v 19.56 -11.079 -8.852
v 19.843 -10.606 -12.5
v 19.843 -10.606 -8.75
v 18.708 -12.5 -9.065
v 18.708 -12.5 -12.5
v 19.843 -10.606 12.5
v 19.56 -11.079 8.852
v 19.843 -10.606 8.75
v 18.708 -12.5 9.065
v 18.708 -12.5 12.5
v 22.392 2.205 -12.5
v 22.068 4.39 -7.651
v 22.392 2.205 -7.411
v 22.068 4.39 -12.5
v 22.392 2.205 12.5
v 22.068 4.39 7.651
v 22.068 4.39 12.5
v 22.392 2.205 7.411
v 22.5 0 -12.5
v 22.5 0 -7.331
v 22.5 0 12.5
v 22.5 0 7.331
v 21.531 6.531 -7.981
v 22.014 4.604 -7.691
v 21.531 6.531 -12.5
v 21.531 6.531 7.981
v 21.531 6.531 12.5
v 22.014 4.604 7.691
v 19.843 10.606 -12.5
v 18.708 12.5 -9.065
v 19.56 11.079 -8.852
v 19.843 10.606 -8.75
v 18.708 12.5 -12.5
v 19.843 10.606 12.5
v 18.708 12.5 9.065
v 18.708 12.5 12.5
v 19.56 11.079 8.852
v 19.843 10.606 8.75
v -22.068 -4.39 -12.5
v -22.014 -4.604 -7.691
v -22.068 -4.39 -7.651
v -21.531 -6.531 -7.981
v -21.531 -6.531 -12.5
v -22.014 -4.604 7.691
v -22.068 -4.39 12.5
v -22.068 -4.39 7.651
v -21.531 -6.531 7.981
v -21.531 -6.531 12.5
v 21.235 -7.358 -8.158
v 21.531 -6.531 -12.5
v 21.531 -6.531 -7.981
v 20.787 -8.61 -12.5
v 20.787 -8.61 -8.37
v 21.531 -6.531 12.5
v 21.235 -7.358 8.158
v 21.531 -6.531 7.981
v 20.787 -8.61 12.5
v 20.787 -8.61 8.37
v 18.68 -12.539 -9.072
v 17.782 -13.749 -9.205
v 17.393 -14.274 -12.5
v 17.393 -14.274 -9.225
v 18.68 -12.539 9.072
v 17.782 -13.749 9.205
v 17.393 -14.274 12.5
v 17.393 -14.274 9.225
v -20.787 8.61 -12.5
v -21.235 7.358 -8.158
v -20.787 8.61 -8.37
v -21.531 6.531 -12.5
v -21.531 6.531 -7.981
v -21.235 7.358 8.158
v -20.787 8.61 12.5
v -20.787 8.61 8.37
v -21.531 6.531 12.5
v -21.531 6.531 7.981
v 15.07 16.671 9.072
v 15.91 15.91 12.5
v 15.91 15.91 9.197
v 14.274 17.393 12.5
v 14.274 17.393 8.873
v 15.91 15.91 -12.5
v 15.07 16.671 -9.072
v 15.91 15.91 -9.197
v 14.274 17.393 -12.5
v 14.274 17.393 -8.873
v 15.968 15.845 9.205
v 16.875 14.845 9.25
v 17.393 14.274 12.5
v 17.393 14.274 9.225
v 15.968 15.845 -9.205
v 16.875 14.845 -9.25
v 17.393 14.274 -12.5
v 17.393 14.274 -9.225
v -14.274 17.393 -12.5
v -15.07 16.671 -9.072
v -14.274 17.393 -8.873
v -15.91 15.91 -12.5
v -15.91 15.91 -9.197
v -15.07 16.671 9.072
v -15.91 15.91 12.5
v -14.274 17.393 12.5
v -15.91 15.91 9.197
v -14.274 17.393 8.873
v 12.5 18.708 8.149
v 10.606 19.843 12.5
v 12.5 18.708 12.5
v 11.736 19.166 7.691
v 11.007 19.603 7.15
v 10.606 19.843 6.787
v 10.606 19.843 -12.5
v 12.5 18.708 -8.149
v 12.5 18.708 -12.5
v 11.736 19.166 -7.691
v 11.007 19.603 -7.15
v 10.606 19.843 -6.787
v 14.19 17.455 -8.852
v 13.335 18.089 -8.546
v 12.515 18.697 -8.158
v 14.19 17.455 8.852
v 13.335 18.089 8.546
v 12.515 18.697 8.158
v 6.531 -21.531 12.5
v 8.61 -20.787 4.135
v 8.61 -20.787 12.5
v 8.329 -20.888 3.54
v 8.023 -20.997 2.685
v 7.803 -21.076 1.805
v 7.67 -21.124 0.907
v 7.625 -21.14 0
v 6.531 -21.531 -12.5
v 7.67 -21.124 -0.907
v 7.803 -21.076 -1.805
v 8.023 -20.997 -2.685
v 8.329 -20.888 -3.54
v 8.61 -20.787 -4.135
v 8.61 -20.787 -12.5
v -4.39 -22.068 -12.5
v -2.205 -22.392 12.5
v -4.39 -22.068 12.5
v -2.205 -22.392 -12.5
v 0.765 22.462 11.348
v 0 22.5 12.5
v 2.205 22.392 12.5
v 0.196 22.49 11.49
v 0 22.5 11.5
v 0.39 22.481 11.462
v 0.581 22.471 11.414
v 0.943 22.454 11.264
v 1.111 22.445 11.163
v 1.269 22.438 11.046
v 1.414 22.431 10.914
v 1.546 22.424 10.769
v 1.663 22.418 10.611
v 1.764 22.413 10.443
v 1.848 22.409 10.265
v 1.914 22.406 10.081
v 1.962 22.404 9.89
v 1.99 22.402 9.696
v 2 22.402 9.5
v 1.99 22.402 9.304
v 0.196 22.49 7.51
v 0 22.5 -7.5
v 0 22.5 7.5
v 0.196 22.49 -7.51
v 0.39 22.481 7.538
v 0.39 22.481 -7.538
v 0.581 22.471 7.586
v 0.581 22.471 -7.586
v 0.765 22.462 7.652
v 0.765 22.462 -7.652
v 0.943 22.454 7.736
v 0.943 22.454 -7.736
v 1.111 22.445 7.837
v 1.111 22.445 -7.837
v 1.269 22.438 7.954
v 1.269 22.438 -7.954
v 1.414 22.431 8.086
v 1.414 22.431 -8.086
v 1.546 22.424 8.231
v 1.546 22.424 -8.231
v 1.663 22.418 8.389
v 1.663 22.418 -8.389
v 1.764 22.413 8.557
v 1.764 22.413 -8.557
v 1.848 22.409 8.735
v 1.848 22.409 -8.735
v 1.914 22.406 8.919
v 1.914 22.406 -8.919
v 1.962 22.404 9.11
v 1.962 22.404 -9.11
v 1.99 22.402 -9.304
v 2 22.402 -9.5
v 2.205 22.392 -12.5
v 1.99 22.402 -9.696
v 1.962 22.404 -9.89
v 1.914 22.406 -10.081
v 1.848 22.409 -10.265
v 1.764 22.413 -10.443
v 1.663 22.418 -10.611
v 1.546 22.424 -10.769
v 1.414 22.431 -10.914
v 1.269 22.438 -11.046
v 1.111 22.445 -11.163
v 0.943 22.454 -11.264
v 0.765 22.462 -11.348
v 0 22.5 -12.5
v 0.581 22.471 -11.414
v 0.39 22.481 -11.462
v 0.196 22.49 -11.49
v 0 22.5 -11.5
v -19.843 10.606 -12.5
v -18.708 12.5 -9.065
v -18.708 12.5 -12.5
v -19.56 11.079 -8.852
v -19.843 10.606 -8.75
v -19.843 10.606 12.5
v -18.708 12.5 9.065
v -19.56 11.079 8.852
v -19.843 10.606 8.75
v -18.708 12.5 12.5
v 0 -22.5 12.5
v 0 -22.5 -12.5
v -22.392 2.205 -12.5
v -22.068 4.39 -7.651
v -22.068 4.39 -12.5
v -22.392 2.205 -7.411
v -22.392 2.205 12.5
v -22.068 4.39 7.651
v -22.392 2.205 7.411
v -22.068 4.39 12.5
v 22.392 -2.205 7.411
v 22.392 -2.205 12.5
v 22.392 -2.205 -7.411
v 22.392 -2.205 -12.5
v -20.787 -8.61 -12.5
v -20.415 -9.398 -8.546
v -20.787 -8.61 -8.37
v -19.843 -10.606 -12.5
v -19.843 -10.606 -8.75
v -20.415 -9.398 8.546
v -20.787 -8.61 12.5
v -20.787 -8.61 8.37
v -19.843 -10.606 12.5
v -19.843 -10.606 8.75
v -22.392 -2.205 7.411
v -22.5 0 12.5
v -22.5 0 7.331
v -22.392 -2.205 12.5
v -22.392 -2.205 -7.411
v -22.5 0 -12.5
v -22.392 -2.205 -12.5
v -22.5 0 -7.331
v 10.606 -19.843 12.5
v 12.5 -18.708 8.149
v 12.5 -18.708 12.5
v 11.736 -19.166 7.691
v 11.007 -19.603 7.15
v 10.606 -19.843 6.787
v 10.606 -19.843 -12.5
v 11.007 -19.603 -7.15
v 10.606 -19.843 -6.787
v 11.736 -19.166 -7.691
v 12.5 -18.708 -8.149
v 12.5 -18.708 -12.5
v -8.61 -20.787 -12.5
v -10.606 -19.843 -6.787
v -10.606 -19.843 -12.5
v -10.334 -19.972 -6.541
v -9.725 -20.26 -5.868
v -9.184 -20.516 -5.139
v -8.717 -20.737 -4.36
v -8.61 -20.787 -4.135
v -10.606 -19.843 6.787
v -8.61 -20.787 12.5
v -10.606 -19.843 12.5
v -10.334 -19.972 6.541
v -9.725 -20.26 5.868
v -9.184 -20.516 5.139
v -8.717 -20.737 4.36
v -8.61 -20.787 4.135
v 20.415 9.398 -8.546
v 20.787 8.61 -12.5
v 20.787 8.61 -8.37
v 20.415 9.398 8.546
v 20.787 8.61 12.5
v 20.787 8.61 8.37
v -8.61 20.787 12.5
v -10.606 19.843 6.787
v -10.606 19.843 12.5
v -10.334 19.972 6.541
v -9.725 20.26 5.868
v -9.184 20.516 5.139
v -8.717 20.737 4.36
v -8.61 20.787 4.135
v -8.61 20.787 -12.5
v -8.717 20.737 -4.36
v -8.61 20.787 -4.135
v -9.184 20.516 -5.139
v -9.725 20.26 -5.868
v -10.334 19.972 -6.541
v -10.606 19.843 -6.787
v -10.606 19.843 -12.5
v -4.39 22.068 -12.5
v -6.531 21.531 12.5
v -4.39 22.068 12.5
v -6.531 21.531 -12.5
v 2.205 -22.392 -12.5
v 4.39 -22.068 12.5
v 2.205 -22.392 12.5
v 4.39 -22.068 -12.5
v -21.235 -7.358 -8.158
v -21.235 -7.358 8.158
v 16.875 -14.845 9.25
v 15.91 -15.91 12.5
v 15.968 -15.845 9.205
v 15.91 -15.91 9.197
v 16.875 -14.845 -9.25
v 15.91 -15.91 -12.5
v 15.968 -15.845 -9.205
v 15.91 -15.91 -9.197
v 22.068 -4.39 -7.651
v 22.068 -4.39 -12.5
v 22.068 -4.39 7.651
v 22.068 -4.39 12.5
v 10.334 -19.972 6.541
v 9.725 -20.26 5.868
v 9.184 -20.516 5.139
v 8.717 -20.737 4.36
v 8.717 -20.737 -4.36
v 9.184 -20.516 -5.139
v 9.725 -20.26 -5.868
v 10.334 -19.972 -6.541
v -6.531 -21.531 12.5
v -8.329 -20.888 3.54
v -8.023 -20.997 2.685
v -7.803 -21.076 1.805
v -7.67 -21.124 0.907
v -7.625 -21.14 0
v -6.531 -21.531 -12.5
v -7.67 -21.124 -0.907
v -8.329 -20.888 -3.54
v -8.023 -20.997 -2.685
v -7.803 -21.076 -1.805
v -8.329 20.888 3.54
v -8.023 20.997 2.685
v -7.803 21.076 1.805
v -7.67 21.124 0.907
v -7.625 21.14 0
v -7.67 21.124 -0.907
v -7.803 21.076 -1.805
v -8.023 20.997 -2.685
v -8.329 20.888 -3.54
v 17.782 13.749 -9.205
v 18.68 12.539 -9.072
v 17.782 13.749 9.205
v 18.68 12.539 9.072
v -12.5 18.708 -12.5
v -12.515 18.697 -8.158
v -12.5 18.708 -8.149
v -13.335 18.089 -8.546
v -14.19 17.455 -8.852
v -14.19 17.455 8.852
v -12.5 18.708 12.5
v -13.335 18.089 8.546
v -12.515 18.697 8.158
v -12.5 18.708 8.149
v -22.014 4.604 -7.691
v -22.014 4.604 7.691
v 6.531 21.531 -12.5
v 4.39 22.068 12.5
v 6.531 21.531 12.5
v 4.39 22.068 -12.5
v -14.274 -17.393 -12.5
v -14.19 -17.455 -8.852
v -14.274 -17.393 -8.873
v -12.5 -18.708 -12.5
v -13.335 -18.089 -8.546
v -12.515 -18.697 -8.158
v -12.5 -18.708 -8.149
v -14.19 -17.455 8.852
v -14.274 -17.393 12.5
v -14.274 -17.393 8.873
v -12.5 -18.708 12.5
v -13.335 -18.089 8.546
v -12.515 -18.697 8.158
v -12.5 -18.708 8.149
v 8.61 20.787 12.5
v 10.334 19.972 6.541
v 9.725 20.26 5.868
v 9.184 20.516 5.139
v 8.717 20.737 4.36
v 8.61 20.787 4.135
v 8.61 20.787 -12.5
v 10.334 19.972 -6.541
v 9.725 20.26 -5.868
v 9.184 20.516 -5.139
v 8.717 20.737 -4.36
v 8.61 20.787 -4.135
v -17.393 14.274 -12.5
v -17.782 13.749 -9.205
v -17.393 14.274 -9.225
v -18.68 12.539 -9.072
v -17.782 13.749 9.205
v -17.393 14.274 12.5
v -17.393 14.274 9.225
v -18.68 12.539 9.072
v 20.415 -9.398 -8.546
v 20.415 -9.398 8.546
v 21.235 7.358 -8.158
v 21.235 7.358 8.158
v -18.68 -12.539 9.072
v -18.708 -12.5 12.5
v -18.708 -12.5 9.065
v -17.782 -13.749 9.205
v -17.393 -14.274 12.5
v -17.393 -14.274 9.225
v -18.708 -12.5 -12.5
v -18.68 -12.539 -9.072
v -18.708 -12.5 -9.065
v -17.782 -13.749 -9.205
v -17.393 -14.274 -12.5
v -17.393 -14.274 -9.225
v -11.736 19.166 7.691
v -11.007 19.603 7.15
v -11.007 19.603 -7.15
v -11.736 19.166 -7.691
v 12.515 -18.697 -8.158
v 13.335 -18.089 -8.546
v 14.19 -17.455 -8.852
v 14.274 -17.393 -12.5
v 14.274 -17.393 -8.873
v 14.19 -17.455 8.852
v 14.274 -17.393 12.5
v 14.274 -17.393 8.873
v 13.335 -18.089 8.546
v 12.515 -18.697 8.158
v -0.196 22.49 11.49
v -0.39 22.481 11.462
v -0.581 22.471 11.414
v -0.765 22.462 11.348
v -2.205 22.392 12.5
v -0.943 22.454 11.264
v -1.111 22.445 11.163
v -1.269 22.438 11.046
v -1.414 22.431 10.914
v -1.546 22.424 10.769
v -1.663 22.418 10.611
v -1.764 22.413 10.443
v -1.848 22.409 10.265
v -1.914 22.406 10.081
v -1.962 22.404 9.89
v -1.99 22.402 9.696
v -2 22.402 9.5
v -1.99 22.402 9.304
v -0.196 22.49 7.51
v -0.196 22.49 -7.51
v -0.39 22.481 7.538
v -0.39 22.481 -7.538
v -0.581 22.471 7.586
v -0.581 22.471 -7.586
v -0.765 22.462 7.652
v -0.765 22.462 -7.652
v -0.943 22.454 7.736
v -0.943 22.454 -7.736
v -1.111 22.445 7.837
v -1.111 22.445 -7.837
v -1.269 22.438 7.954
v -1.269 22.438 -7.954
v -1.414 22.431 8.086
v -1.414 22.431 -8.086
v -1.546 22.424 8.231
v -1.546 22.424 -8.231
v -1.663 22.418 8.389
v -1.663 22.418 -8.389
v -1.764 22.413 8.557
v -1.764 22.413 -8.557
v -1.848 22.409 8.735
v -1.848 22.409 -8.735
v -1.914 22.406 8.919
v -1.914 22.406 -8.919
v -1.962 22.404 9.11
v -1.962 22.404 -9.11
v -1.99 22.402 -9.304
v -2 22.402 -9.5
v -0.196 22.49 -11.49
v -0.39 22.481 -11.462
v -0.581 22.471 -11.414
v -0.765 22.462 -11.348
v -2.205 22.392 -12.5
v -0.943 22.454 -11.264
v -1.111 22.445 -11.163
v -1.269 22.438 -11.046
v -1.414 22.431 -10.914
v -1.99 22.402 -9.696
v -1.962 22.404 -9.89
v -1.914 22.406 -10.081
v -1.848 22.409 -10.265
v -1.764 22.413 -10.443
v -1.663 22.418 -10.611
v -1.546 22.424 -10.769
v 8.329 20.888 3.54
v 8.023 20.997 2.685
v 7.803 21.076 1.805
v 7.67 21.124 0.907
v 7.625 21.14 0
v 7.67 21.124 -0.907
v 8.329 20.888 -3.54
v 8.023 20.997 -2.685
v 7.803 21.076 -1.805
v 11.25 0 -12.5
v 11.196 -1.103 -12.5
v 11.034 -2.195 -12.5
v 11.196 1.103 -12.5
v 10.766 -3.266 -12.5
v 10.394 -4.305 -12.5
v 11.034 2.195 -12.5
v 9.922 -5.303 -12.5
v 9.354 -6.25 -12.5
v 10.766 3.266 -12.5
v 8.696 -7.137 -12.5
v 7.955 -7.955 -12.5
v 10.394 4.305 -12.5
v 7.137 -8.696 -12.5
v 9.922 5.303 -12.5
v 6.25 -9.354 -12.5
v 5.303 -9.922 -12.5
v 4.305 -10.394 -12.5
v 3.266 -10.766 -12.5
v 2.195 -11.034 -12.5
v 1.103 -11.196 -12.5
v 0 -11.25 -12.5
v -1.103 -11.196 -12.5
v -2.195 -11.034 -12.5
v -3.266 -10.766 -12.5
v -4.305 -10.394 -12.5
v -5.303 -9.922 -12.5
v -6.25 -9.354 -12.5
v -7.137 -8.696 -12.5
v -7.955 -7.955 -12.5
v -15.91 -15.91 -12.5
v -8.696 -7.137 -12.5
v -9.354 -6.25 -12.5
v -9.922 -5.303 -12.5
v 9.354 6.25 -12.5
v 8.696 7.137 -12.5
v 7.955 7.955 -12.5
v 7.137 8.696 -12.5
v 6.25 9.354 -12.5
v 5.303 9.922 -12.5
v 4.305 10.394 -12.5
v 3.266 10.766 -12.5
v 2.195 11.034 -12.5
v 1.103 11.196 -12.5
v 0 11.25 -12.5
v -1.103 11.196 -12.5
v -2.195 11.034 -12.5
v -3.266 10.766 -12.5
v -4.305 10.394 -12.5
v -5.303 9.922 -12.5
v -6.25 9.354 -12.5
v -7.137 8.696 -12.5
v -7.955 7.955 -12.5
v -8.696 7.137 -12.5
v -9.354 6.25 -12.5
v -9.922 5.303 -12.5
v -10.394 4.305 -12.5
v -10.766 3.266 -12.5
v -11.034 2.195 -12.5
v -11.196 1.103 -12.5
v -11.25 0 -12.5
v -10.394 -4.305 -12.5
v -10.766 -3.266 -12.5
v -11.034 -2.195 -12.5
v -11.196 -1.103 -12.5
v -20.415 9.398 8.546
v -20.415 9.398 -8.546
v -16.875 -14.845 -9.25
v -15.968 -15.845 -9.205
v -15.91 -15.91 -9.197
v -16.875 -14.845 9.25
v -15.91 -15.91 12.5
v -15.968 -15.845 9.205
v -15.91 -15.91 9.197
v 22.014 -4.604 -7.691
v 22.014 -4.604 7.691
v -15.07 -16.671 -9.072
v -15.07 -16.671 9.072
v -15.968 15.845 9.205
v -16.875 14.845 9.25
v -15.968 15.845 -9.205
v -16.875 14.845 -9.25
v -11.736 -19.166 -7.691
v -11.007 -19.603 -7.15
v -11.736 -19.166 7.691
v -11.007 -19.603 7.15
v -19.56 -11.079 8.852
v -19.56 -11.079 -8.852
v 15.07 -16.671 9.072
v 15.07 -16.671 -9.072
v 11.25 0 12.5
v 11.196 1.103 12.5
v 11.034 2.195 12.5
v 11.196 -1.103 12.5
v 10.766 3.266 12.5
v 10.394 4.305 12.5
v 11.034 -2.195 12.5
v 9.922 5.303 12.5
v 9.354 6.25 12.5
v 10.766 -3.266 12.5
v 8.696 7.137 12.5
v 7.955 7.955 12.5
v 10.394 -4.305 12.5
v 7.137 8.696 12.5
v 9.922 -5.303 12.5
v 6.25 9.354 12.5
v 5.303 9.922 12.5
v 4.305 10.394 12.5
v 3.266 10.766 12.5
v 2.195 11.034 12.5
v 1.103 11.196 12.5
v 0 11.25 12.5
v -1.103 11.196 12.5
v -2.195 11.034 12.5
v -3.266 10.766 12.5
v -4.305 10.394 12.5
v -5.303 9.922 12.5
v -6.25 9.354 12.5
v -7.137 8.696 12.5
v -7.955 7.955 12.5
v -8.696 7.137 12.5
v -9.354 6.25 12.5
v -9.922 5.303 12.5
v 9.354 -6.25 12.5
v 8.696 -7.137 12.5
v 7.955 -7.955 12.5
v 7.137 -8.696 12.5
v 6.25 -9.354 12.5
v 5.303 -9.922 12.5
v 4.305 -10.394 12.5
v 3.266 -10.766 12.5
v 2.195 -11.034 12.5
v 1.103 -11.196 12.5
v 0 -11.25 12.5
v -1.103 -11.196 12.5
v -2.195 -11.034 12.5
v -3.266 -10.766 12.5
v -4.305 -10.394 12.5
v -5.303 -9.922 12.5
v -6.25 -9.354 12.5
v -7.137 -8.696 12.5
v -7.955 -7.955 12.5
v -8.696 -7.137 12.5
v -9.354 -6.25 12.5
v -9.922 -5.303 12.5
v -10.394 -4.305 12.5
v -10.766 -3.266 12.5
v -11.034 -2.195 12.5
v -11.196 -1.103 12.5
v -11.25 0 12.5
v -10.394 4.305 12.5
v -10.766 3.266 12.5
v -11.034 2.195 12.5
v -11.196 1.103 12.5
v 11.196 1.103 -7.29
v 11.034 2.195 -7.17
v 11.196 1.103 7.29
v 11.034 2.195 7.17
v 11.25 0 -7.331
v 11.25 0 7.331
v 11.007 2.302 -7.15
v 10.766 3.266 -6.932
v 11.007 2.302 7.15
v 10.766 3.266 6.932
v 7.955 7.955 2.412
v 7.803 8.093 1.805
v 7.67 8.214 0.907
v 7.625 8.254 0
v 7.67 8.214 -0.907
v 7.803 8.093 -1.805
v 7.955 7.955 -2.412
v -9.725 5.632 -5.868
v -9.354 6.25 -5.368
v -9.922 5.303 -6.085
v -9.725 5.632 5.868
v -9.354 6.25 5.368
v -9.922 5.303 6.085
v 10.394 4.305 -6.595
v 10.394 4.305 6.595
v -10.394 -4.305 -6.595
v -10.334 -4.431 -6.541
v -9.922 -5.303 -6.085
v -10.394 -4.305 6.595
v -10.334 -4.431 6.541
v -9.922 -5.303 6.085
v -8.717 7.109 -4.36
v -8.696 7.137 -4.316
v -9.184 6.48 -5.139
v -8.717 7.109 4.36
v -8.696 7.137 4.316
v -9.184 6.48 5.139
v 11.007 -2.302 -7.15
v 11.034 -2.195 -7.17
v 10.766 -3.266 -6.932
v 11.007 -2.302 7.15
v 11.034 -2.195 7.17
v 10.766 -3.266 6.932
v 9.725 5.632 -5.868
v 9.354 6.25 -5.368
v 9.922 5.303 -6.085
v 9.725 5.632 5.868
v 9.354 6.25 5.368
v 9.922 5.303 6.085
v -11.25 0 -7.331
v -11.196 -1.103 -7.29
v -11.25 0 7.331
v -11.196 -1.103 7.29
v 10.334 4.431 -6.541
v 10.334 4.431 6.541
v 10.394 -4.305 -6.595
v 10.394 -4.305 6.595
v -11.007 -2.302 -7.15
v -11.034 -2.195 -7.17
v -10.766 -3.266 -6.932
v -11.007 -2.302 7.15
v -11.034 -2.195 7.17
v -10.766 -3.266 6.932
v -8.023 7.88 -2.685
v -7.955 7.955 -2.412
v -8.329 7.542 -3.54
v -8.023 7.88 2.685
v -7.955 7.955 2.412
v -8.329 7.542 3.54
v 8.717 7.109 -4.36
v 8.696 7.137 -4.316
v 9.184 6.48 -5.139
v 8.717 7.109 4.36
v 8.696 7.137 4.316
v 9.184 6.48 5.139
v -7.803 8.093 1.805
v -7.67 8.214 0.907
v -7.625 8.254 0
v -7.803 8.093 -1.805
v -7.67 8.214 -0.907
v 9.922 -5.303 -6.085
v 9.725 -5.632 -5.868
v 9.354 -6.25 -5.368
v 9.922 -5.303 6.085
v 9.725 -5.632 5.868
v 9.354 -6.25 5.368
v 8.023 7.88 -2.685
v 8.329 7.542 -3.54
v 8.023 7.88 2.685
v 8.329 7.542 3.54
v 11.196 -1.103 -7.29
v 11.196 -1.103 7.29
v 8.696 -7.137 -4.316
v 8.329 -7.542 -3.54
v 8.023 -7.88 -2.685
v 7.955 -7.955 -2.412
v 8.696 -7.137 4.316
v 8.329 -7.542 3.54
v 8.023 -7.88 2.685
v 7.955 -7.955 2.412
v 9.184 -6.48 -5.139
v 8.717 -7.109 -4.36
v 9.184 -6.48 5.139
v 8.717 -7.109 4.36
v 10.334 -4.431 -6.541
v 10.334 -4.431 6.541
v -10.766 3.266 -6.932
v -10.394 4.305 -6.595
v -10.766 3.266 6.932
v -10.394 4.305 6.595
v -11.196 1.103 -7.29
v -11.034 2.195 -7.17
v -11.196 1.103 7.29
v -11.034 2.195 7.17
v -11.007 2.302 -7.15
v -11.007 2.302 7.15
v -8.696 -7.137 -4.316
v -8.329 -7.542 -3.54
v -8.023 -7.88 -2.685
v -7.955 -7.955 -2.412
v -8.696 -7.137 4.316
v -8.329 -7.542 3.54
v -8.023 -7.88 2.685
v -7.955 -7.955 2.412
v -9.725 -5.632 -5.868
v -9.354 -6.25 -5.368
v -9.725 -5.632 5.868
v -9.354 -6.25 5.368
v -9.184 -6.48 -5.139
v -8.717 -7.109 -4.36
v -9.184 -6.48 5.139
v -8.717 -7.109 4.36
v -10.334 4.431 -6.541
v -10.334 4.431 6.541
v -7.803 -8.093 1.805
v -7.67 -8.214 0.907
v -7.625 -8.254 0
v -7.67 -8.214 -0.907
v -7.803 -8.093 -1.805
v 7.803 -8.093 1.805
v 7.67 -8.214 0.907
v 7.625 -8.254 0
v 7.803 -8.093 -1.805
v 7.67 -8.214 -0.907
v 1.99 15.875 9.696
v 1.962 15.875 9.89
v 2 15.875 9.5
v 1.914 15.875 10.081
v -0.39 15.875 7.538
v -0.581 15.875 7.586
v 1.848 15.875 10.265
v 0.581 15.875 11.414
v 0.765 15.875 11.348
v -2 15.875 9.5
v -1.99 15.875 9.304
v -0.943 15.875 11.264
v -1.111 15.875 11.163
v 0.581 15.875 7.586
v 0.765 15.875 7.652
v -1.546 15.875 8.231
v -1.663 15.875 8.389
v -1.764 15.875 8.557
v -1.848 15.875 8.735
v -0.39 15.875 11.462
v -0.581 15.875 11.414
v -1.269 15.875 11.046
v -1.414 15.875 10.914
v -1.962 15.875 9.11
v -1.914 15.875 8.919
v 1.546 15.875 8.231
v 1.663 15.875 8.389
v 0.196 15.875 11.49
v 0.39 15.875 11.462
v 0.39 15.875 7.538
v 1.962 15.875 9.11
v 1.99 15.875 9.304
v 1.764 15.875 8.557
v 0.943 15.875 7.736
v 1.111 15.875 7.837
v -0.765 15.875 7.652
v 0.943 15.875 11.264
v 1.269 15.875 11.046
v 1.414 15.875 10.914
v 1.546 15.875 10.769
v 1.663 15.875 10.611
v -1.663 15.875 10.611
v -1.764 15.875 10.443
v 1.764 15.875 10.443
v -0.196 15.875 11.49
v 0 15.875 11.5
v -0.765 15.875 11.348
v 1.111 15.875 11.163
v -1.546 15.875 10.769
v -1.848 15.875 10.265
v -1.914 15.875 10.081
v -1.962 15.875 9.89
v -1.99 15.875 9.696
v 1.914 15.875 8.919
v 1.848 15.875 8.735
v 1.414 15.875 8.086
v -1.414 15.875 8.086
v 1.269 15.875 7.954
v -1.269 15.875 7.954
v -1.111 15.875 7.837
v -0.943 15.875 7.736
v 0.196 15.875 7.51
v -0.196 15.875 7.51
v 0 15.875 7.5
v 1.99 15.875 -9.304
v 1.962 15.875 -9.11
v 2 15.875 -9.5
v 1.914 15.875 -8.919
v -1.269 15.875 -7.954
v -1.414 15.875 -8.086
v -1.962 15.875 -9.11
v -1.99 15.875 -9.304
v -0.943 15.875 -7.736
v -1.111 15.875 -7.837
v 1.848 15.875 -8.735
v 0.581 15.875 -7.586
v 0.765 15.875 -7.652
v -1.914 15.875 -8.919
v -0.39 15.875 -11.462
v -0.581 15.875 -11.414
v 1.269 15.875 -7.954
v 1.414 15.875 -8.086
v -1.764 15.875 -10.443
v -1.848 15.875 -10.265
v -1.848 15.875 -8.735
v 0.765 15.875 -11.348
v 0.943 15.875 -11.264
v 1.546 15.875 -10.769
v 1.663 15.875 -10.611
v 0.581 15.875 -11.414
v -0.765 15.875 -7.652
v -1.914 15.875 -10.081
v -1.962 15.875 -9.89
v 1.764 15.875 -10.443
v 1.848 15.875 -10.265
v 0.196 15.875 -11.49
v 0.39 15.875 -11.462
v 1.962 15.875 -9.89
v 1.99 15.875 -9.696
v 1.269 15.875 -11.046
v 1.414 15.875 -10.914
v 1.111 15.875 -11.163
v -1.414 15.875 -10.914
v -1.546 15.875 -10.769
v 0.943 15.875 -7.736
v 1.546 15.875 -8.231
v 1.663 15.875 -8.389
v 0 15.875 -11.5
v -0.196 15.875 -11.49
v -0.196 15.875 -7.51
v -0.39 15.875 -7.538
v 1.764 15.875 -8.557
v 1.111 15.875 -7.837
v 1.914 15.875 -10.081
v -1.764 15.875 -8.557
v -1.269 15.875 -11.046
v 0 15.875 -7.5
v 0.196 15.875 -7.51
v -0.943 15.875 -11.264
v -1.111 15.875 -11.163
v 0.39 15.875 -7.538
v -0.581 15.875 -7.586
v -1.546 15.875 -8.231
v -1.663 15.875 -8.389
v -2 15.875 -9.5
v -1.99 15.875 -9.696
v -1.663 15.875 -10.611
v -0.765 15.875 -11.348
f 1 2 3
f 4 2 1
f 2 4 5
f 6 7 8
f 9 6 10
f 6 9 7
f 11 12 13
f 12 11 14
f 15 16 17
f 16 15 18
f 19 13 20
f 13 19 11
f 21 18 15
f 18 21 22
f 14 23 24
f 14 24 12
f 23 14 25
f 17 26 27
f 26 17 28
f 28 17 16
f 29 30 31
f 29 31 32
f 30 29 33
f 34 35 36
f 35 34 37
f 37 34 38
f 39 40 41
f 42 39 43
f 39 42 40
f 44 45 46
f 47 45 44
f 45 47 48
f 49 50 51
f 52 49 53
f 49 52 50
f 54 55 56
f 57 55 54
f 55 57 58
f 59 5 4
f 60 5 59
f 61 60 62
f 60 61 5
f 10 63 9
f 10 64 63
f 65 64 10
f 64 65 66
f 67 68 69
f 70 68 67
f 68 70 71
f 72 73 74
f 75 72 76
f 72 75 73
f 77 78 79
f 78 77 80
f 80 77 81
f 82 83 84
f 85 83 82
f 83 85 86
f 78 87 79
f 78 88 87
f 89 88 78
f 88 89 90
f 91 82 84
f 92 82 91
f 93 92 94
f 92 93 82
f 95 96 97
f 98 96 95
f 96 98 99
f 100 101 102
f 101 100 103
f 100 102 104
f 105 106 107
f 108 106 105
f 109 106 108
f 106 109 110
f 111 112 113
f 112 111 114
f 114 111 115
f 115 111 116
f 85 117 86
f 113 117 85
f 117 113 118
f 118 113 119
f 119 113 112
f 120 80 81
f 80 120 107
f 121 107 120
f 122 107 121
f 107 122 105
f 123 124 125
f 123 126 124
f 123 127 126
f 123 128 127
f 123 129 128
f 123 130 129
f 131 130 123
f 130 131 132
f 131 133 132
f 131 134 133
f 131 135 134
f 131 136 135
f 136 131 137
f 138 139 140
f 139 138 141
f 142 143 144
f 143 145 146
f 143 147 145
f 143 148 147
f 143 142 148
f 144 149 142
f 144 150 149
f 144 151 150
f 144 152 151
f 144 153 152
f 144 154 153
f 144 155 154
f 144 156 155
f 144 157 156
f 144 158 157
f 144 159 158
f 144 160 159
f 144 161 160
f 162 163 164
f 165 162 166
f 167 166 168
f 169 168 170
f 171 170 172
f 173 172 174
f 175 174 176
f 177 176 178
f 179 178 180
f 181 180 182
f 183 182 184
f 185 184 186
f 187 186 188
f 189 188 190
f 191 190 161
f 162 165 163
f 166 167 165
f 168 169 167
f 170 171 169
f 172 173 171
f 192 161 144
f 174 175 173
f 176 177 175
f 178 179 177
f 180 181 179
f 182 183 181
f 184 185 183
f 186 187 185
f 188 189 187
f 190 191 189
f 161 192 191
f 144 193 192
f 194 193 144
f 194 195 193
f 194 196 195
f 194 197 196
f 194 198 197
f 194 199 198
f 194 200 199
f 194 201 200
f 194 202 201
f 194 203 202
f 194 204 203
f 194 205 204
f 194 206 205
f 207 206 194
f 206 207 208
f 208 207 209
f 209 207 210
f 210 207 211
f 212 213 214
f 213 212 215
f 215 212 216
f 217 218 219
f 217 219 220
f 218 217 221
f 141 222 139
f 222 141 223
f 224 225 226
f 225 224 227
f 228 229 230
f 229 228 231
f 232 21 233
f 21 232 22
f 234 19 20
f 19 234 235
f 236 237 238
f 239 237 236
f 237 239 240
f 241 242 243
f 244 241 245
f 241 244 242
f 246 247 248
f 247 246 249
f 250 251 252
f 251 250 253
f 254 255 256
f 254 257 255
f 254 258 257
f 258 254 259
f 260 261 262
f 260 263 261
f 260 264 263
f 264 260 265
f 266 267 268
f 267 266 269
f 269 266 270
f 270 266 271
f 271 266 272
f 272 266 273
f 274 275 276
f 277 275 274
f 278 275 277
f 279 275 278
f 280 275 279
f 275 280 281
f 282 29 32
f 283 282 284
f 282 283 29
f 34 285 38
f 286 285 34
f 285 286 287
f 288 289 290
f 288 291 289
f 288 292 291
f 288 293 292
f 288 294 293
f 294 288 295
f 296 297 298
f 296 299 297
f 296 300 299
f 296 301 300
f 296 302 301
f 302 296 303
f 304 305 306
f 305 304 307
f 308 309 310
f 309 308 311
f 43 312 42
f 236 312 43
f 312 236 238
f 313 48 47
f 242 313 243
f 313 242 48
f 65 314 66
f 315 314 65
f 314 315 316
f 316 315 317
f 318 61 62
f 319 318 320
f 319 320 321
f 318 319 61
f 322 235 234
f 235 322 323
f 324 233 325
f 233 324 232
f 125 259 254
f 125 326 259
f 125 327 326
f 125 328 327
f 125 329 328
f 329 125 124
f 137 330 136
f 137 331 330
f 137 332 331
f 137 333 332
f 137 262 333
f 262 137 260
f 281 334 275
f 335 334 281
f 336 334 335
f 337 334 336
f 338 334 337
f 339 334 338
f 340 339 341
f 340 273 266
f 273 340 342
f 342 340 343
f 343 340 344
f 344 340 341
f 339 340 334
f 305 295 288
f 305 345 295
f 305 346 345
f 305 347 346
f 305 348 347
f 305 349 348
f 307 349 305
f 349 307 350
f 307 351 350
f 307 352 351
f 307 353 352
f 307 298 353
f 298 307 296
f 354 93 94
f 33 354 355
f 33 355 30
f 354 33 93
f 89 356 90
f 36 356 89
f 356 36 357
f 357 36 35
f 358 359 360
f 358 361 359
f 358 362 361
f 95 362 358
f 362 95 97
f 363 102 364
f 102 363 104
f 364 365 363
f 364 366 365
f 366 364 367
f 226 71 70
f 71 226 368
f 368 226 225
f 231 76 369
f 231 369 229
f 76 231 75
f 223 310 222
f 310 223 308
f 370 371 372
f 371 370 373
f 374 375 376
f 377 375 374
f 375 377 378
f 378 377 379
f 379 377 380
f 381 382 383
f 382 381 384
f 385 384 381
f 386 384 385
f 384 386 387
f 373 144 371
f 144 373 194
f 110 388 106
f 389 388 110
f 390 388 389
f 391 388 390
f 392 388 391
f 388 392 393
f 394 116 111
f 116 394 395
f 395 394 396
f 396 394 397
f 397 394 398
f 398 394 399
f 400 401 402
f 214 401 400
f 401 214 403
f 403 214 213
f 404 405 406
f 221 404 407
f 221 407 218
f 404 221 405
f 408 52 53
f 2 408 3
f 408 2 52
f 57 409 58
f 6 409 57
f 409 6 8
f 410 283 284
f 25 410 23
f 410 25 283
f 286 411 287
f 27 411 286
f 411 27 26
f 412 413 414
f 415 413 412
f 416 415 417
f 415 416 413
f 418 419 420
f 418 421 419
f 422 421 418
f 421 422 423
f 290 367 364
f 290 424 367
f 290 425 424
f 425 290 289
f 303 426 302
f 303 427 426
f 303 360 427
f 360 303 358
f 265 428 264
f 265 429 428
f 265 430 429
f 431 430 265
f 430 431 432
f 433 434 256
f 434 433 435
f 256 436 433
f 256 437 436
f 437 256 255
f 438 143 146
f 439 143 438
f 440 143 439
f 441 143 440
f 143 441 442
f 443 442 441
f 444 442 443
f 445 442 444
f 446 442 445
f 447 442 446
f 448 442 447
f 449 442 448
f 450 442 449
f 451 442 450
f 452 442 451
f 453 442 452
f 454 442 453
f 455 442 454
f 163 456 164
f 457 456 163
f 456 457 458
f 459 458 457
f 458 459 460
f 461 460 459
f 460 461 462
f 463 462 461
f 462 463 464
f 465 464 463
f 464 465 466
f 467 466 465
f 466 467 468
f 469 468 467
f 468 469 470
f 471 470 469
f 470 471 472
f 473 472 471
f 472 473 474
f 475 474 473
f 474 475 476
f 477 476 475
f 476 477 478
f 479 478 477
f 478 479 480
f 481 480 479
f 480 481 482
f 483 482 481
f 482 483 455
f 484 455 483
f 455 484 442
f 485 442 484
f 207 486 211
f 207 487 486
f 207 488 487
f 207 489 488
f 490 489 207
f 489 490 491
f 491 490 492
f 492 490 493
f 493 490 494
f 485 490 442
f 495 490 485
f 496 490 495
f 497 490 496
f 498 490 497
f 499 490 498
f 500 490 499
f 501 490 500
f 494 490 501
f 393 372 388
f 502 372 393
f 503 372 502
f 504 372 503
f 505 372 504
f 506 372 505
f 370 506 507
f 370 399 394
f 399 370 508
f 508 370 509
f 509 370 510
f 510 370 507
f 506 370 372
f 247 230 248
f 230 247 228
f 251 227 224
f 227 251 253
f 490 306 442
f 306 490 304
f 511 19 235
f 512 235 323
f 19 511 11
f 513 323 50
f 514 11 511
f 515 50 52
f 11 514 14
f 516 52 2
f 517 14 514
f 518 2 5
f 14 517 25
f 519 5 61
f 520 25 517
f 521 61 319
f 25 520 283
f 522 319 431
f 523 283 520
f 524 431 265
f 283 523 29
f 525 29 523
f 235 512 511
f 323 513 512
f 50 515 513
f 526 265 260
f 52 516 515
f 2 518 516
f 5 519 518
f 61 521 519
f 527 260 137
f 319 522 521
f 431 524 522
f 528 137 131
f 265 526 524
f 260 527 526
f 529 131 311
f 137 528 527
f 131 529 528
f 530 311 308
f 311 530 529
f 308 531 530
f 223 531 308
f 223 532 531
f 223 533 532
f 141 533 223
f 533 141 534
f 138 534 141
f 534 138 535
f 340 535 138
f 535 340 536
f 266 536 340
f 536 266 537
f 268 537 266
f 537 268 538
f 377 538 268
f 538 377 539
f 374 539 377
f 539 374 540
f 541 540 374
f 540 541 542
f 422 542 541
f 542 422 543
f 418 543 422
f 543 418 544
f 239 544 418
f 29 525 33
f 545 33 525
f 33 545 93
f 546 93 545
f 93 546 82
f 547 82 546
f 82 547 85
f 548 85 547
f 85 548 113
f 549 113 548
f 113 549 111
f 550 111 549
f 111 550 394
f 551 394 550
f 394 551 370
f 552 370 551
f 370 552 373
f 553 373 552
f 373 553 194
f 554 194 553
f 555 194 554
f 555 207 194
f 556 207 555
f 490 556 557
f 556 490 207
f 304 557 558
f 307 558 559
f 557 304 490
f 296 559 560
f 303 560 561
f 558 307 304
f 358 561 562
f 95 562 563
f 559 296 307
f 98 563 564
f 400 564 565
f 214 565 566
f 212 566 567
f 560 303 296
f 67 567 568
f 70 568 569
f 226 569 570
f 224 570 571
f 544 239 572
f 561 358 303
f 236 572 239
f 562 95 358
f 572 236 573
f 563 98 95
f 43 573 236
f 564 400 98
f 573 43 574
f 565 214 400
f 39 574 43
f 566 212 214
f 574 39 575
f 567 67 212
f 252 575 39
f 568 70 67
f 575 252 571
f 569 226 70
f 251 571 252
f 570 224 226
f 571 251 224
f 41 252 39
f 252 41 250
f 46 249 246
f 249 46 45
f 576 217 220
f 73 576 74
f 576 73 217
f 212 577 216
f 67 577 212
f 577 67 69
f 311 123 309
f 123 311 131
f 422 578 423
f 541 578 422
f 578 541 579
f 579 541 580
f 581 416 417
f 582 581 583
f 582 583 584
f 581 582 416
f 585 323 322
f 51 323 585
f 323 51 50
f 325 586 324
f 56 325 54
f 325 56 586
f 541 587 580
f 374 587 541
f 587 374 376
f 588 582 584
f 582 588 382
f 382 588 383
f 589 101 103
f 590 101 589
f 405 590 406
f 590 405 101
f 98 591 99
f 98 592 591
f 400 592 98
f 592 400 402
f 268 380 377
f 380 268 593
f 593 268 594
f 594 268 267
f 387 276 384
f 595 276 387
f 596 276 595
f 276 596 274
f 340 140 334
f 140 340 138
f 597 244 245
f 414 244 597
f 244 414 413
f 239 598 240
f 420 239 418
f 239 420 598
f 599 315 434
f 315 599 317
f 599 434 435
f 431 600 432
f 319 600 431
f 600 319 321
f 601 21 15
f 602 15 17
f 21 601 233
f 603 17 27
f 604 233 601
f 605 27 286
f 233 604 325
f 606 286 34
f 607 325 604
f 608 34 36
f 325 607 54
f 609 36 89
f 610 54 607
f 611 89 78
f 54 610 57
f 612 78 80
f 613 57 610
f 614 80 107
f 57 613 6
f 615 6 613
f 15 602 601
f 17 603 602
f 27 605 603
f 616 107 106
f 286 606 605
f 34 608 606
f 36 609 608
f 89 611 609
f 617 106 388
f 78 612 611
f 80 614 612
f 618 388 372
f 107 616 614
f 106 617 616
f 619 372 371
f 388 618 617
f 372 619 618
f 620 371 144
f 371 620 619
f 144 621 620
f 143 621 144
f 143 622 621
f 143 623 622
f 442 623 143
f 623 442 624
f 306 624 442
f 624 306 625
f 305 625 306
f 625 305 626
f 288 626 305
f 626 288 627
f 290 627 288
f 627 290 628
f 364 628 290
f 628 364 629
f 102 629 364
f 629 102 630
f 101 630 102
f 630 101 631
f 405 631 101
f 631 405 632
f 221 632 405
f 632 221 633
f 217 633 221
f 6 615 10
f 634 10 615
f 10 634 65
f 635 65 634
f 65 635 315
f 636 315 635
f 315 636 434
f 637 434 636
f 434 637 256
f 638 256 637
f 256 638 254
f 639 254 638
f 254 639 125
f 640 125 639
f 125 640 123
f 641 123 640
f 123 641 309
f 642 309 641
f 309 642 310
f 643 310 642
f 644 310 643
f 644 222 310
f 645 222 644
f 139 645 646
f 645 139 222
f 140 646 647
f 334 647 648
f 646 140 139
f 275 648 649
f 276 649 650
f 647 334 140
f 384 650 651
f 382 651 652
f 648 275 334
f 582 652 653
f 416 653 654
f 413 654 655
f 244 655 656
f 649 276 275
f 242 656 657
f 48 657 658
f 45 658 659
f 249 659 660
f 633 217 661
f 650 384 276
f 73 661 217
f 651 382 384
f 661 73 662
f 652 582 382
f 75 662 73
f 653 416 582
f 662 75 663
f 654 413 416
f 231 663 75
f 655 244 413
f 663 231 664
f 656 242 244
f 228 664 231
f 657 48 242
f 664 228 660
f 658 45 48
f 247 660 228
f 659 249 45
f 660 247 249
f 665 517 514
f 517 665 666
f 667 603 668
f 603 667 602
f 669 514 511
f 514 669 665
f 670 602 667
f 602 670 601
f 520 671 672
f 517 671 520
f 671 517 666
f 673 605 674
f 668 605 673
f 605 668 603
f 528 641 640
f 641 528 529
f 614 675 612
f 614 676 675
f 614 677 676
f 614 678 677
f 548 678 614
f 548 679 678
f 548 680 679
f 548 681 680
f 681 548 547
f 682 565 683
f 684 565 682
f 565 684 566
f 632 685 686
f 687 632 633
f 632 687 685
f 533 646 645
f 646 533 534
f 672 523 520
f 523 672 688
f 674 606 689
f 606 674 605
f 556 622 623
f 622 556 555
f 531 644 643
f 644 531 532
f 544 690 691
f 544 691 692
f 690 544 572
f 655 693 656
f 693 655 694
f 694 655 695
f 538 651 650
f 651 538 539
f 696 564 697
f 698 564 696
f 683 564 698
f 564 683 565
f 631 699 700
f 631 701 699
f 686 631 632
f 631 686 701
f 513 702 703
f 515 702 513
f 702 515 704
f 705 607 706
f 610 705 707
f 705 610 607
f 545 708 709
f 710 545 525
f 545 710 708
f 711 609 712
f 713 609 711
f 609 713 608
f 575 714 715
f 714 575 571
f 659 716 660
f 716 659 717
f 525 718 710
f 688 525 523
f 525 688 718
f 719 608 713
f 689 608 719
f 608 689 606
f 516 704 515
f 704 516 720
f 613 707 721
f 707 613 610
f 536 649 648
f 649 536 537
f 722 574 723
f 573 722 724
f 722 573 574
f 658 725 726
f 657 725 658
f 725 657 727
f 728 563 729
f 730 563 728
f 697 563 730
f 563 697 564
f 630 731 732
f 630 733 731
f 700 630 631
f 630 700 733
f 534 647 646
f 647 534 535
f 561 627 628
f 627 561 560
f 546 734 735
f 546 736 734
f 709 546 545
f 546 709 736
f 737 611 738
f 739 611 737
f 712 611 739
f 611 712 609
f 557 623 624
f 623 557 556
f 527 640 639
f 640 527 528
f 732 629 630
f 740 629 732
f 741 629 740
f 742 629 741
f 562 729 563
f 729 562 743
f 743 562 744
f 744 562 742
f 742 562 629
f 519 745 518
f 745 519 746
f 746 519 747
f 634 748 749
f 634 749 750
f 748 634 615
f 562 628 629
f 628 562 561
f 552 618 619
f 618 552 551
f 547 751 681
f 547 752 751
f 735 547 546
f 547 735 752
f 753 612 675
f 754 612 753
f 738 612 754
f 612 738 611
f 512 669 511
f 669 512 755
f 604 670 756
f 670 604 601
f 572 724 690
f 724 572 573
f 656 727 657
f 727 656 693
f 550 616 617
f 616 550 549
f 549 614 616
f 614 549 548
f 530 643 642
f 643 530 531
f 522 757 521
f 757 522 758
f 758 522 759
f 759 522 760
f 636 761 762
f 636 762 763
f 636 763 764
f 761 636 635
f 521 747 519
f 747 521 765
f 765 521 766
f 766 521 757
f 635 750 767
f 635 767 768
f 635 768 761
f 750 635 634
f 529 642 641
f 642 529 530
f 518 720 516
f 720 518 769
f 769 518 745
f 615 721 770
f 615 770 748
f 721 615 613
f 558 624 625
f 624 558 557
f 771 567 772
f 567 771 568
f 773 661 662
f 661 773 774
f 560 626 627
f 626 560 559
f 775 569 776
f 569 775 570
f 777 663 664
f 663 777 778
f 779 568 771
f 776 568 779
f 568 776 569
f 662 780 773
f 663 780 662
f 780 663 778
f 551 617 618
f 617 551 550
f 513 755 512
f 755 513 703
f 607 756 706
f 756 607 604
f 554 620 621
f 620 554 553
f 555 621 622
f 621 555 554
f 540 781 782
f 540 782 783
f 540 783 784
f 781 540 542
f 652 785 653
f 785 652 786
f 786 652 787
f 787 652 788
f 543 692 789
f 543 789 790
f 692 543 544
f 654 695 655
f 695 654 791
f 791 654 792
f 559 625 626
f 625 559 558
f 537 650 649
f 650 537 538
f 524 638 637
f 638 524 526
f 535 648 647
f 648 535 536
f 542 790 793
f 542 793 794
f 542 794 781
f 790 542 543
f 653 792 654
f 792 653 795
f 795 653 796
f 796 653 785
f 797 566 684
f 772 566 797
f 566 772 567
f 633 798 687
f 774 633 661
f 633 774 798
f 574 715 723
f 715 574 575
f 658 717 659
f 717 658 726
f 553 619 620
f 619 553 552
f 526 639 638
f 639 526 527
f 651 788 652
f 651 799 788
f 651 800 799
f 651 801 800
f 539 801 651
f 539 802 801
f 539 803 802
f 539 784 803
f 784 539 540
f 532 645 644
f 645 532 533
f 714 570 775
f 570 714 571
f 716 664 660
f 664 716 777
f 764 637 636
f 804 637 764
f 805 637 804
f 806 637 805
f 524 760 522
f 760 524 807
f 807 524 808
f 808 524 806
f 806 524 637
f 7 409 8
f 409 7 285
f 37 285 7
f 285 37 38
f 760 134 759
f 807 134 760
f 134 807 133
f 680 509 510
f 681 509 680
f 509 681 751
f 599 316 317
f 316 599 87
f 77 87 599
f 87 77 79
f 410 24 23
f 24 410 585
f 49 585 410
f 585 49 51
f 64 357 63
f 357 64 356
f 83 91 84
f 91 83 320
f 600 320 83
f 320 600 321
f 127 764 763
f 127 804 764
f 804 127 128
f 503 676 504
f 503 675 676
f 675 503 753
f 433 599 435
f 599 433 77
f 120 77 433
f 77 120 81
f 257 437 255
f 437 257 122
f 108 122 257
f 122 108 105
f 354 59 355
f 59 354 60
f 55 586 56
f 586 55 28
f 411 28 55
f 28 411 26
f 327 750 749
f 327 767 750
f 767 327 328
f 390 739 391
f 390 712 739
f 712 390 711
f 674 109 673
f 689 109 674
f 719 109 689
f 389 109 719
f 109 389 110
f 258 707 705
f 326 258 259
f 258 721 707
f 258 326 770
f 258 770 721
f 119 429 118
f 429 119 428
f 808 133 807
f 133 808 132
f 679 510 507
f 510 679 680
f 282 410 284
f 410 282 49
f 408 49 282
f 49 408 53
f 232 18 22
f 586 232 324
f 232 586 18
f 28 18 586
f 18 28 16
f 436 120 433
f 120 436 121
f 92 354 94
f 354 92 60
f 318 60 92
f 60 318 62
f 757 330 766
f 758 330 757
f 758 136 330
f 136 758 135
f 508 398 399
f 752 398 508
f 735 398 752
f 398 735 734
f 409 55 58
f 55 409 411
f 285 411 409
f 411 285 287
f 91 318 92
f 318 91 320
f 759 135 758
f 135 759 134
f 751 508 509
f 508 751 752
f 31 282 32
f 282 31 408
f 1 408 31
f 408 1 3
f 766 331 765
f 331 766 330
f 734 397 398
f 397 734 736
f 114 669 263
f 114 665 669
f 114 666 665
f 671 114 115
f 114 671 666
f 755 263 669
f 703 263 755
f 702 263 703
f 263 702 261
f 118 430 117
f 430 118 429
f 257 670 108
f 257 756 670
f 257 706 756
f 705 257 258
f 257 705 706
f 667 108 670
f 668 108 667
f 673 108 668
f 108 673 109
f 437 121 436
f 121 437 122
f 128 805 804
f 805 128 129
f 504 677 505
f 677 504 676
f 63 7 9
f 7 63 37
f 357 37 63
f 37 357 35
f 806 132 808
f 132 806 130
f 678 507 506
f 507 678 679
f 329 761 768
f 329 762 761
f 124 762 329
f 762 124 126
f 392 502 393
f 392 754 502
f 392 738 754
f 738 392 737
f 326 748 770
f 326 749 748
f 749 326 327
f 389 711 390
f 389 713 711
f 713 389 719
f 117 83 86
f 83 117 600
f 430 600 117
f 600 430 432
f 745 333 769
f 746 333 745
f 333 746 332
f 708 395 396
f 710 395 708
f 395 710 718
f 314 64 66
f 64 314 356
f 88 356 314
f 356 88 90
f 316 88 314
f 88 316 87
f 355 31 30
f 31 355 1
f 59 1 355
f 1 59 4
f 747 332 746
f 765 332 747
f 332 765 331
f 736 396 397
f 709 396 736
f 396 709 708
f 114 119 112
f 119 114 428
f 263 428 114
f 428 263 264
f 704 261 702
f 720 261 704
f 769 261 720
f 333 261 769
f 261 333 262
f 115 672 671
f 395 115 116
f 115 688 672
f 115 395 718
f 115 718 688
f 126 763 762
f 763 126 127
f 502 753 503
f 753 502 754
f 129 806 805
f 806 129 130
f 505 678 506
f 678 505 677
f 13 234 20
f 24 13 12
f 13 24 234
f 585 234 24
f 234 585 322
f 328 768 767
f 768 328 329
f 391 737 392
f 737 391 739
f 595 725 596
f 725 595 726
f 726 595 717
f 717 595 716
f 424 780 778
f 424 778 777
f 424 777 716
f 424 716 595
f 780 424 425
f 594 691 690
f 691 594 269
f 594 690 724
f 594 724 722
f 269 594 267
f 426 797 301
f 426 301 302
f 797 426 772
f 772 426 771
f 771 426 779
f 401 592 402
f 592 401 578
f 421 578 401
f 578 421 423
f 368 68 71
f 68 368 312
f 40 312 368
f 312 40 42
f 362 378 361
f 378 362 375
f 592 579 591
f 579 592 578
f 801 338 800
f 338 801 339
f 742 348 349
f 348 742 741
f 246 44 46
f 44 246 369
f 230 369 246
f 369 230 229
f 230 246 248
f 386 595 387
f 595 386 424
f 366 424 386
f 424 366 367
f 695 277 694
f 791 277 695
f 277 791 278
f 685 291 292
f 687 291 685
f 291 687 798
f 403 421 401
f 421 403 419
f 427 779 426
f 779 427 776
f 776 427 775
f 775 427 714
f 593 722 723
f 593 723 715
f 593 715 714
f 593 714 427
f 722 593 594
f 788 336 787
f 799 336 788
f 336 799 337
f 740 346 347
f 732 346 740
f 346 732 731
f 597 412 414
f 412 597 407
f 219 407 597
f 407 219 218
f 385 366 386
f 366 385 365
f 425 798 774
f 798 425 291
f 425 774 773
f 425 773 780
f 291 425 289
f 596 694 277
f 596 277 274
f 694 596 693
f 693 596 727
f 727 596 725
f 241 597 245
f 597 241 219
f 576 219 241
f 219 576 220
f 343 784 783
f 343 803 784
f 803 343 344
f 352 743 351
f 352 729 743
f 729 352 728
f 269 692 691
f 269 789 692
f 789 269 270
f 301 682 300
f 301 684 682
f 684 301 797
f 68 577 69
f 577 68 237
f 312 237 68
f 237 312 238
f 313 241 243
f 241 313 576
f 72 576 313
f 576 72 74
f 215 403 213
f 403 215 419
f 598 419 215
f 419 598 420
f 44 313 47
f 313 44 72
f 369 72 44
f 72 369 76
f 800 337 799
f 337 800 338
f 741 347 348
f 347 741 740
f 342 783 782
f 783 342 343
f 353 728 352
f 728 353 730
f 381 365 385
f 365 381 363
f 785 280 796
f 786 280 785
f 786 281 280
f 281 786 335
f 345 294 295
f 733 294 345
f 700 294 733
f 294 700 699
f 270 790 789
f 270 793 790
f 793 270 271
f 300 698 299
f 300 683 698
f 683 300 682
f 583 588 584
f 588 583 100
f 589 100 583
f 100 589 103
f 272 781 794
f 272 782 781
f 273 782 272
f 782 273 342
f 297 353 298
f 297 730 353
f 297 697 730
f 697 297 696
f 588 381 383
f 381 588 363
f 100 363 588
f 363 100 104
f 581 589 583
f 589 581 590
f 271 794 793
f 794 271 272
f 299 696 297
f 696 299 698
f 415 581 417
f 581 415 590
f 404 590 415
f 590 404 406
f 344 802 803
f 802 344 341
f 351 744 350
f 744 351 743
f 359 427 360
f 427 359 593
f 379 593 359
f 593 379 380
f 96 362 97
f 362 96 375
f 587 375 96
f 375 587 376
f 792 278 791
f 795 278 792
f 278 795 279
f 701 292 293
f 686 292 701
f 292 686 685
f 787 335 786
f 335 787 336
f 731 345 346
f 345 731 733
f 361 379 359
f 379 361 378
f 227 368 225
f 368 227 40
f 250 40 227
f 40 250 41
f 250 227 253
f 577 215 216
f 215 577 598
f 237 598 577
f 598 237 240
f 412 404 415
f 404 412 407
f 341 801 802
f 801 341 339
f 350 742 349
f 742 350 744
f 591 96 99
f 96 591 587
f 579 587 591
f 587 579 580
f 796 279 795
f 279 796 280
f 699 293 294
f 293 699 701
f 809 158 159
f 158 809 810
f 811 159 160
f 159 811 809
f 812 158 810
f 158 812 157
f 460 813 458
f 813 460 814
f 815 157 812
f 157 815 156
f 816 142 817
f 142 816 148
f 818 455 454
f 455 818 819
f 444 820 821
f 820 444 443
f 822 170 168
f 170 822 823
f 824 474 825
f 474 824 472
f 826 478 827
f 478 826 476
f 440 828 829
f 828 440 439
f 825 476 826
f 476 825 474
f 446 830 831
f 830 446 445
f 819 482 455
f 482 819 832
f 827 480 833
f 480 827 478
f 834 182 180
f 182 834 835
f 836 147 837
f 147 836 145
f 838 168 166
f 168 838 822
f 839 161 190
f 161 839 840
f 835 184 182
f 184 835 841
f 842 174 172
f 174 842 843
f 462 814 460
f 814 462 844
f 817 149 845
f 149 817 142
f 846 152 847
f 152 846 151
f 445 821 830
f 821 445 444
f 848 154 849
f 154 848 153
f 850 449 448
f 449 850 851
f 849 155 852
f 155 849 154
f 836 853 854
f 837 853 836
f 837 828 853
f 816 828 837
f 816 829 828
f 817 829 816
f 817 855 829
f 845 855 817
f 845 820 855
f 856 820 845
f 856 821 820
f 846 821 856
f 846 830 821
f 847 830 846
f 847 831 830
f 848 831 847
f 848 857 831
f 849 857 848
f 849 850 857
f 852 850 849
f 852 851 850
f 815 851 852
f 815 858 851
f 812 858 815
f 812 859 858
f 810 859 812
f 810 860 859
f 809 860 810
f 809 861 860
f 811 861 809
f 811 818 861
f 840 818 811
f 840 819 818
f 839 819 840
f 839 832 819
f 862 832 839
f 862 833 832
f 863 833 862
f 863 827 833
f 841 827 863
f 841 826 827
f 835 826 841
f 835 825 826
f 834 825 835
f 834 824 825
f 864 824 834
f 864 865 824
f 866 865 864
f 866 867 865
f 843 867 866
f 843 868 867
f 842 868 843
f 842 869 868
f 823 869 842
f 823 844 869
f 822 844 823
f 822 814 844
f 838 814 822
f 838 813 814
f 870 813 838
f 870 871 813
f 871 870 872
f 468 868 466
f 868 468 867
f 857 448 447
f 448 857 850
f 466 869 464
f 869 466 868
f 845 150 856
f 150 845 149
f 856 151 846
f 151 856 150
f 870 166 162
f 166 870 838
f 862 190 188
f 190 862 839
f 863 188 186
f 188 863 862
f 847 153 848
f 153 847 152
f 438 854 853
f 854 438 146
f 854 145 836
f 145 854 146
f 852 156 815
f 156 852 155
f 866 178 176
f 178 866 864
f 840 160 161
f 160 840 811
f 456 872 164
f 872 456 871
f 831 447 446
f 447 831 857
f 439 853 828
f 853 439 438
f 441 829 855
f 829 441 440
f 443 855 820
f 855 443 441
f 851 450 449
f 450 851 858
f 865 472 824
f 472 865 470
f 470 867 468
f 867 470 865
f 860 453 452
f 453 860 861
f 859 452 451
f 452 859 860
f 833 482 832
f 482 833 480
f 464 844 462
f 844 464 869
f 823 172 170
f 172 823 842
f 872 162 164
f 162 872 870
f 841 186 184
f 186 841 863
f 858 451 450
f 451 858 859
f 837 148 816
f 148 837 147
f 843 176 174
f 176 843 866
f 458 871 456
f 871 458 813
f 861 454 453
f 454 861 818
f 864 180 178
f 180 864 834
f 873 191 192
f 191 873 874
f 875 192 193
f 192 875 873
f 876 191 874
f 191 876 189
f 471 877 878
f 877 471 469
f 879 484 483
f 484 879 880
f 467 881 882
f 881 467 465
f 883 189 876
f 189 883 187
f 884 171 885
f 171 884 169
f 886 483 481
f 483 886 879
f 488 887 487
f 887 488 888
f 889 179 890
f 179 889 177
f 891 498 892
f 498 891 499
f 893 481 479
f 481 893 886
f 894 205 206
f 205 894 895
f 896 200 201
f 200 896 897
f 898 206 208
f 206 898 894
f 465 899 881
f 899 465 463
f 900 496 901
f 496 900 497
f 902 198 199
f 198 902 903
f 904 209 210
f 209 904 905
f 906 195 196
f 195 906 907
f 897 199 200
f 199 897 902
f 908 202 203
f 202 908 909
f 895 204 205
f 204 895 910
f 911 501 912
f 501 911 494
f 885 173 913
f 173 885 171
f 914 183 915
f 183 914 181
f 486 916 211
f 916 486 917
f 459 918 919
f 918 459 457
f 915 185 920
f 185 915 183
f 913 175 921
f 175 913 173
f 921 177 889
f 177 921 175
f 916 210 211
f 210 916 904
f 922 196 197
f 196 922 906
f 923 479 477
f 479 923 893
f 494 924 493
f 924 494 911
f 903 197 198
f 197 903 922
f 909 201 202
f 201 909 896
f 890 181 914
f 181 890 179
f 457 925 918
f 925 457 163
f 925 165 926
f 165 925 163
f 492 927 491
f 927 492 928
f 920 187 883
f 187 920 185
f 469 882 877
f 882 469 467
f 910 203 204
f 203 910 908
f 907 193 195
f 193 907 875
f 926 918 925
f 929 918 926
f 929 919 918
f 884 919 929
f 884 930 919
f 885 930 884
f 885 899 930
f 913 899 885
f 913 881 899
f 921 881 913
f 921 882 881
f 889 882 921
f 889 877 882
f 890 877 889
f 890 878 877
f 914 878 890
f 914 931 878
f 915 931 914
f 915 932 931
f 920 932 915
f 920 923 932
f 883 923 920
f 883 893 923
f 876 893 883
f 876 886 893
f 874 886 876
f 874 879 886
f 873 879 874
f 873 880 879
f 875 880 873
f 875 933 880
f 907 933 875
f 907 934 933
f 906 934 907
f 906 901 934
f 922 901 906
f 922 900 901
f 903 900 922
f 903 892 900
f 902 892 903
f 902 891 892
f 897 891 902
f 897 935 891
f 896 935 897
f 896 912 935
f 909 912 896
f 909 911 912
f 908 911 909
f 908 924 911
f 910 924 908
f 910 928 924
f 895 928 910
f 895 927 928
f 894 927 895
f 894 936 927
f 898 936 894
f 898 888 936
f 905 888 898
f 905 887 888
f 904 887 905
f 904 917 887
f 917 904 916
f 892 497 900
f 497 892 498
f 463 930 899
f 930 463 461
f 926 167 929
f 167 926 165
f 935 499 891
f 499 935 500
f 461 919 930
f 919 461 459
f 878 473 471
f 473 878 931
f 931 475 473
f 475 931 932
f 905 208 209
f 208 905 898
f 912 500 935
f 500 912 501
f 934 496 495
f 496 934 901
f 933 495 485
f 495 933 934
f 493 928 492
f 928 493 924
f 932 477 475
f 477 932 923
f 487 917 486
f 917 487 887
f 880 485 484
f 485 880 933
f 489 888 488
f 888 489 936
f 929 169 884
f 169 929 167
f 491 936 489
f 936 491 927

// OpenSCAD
// COBRA Vertebra - L3 V21
// Height: 25.0mm, OD: 45.0mm

$fn = 64;

difference() {
    // Outer cylinder
    cylinder(h=25.0, d=45.0, center=true);
    
    // Inner channel
    cylinder(h=27.0, d=22.5, center=true);

    // Battery cavity 1
    rotate([0, 0, 0])
    translate([16.875, 0, 0])
    rotate([90, 0, 0])
    cylinder(h=74.0, d=18.5, center=true);

    // Battery cavity 2
    rotate([0, 0, 180])
    translate([16.875, 0, 0])
    rotate([90, 0, 0])
    cylinder(h=74.0, d=18.5, center=true);

    // Pivot holes
    translate([0, 22.5, 9.5])
    rotate([90, 0, 0])
    cylinder(h=13.25, d=4, center=true);
    
    translate([0, 22.5, -9.5])
    rotate([90, 0, 0])
    cylinder(h=13.25, d=4, center=true);
}
